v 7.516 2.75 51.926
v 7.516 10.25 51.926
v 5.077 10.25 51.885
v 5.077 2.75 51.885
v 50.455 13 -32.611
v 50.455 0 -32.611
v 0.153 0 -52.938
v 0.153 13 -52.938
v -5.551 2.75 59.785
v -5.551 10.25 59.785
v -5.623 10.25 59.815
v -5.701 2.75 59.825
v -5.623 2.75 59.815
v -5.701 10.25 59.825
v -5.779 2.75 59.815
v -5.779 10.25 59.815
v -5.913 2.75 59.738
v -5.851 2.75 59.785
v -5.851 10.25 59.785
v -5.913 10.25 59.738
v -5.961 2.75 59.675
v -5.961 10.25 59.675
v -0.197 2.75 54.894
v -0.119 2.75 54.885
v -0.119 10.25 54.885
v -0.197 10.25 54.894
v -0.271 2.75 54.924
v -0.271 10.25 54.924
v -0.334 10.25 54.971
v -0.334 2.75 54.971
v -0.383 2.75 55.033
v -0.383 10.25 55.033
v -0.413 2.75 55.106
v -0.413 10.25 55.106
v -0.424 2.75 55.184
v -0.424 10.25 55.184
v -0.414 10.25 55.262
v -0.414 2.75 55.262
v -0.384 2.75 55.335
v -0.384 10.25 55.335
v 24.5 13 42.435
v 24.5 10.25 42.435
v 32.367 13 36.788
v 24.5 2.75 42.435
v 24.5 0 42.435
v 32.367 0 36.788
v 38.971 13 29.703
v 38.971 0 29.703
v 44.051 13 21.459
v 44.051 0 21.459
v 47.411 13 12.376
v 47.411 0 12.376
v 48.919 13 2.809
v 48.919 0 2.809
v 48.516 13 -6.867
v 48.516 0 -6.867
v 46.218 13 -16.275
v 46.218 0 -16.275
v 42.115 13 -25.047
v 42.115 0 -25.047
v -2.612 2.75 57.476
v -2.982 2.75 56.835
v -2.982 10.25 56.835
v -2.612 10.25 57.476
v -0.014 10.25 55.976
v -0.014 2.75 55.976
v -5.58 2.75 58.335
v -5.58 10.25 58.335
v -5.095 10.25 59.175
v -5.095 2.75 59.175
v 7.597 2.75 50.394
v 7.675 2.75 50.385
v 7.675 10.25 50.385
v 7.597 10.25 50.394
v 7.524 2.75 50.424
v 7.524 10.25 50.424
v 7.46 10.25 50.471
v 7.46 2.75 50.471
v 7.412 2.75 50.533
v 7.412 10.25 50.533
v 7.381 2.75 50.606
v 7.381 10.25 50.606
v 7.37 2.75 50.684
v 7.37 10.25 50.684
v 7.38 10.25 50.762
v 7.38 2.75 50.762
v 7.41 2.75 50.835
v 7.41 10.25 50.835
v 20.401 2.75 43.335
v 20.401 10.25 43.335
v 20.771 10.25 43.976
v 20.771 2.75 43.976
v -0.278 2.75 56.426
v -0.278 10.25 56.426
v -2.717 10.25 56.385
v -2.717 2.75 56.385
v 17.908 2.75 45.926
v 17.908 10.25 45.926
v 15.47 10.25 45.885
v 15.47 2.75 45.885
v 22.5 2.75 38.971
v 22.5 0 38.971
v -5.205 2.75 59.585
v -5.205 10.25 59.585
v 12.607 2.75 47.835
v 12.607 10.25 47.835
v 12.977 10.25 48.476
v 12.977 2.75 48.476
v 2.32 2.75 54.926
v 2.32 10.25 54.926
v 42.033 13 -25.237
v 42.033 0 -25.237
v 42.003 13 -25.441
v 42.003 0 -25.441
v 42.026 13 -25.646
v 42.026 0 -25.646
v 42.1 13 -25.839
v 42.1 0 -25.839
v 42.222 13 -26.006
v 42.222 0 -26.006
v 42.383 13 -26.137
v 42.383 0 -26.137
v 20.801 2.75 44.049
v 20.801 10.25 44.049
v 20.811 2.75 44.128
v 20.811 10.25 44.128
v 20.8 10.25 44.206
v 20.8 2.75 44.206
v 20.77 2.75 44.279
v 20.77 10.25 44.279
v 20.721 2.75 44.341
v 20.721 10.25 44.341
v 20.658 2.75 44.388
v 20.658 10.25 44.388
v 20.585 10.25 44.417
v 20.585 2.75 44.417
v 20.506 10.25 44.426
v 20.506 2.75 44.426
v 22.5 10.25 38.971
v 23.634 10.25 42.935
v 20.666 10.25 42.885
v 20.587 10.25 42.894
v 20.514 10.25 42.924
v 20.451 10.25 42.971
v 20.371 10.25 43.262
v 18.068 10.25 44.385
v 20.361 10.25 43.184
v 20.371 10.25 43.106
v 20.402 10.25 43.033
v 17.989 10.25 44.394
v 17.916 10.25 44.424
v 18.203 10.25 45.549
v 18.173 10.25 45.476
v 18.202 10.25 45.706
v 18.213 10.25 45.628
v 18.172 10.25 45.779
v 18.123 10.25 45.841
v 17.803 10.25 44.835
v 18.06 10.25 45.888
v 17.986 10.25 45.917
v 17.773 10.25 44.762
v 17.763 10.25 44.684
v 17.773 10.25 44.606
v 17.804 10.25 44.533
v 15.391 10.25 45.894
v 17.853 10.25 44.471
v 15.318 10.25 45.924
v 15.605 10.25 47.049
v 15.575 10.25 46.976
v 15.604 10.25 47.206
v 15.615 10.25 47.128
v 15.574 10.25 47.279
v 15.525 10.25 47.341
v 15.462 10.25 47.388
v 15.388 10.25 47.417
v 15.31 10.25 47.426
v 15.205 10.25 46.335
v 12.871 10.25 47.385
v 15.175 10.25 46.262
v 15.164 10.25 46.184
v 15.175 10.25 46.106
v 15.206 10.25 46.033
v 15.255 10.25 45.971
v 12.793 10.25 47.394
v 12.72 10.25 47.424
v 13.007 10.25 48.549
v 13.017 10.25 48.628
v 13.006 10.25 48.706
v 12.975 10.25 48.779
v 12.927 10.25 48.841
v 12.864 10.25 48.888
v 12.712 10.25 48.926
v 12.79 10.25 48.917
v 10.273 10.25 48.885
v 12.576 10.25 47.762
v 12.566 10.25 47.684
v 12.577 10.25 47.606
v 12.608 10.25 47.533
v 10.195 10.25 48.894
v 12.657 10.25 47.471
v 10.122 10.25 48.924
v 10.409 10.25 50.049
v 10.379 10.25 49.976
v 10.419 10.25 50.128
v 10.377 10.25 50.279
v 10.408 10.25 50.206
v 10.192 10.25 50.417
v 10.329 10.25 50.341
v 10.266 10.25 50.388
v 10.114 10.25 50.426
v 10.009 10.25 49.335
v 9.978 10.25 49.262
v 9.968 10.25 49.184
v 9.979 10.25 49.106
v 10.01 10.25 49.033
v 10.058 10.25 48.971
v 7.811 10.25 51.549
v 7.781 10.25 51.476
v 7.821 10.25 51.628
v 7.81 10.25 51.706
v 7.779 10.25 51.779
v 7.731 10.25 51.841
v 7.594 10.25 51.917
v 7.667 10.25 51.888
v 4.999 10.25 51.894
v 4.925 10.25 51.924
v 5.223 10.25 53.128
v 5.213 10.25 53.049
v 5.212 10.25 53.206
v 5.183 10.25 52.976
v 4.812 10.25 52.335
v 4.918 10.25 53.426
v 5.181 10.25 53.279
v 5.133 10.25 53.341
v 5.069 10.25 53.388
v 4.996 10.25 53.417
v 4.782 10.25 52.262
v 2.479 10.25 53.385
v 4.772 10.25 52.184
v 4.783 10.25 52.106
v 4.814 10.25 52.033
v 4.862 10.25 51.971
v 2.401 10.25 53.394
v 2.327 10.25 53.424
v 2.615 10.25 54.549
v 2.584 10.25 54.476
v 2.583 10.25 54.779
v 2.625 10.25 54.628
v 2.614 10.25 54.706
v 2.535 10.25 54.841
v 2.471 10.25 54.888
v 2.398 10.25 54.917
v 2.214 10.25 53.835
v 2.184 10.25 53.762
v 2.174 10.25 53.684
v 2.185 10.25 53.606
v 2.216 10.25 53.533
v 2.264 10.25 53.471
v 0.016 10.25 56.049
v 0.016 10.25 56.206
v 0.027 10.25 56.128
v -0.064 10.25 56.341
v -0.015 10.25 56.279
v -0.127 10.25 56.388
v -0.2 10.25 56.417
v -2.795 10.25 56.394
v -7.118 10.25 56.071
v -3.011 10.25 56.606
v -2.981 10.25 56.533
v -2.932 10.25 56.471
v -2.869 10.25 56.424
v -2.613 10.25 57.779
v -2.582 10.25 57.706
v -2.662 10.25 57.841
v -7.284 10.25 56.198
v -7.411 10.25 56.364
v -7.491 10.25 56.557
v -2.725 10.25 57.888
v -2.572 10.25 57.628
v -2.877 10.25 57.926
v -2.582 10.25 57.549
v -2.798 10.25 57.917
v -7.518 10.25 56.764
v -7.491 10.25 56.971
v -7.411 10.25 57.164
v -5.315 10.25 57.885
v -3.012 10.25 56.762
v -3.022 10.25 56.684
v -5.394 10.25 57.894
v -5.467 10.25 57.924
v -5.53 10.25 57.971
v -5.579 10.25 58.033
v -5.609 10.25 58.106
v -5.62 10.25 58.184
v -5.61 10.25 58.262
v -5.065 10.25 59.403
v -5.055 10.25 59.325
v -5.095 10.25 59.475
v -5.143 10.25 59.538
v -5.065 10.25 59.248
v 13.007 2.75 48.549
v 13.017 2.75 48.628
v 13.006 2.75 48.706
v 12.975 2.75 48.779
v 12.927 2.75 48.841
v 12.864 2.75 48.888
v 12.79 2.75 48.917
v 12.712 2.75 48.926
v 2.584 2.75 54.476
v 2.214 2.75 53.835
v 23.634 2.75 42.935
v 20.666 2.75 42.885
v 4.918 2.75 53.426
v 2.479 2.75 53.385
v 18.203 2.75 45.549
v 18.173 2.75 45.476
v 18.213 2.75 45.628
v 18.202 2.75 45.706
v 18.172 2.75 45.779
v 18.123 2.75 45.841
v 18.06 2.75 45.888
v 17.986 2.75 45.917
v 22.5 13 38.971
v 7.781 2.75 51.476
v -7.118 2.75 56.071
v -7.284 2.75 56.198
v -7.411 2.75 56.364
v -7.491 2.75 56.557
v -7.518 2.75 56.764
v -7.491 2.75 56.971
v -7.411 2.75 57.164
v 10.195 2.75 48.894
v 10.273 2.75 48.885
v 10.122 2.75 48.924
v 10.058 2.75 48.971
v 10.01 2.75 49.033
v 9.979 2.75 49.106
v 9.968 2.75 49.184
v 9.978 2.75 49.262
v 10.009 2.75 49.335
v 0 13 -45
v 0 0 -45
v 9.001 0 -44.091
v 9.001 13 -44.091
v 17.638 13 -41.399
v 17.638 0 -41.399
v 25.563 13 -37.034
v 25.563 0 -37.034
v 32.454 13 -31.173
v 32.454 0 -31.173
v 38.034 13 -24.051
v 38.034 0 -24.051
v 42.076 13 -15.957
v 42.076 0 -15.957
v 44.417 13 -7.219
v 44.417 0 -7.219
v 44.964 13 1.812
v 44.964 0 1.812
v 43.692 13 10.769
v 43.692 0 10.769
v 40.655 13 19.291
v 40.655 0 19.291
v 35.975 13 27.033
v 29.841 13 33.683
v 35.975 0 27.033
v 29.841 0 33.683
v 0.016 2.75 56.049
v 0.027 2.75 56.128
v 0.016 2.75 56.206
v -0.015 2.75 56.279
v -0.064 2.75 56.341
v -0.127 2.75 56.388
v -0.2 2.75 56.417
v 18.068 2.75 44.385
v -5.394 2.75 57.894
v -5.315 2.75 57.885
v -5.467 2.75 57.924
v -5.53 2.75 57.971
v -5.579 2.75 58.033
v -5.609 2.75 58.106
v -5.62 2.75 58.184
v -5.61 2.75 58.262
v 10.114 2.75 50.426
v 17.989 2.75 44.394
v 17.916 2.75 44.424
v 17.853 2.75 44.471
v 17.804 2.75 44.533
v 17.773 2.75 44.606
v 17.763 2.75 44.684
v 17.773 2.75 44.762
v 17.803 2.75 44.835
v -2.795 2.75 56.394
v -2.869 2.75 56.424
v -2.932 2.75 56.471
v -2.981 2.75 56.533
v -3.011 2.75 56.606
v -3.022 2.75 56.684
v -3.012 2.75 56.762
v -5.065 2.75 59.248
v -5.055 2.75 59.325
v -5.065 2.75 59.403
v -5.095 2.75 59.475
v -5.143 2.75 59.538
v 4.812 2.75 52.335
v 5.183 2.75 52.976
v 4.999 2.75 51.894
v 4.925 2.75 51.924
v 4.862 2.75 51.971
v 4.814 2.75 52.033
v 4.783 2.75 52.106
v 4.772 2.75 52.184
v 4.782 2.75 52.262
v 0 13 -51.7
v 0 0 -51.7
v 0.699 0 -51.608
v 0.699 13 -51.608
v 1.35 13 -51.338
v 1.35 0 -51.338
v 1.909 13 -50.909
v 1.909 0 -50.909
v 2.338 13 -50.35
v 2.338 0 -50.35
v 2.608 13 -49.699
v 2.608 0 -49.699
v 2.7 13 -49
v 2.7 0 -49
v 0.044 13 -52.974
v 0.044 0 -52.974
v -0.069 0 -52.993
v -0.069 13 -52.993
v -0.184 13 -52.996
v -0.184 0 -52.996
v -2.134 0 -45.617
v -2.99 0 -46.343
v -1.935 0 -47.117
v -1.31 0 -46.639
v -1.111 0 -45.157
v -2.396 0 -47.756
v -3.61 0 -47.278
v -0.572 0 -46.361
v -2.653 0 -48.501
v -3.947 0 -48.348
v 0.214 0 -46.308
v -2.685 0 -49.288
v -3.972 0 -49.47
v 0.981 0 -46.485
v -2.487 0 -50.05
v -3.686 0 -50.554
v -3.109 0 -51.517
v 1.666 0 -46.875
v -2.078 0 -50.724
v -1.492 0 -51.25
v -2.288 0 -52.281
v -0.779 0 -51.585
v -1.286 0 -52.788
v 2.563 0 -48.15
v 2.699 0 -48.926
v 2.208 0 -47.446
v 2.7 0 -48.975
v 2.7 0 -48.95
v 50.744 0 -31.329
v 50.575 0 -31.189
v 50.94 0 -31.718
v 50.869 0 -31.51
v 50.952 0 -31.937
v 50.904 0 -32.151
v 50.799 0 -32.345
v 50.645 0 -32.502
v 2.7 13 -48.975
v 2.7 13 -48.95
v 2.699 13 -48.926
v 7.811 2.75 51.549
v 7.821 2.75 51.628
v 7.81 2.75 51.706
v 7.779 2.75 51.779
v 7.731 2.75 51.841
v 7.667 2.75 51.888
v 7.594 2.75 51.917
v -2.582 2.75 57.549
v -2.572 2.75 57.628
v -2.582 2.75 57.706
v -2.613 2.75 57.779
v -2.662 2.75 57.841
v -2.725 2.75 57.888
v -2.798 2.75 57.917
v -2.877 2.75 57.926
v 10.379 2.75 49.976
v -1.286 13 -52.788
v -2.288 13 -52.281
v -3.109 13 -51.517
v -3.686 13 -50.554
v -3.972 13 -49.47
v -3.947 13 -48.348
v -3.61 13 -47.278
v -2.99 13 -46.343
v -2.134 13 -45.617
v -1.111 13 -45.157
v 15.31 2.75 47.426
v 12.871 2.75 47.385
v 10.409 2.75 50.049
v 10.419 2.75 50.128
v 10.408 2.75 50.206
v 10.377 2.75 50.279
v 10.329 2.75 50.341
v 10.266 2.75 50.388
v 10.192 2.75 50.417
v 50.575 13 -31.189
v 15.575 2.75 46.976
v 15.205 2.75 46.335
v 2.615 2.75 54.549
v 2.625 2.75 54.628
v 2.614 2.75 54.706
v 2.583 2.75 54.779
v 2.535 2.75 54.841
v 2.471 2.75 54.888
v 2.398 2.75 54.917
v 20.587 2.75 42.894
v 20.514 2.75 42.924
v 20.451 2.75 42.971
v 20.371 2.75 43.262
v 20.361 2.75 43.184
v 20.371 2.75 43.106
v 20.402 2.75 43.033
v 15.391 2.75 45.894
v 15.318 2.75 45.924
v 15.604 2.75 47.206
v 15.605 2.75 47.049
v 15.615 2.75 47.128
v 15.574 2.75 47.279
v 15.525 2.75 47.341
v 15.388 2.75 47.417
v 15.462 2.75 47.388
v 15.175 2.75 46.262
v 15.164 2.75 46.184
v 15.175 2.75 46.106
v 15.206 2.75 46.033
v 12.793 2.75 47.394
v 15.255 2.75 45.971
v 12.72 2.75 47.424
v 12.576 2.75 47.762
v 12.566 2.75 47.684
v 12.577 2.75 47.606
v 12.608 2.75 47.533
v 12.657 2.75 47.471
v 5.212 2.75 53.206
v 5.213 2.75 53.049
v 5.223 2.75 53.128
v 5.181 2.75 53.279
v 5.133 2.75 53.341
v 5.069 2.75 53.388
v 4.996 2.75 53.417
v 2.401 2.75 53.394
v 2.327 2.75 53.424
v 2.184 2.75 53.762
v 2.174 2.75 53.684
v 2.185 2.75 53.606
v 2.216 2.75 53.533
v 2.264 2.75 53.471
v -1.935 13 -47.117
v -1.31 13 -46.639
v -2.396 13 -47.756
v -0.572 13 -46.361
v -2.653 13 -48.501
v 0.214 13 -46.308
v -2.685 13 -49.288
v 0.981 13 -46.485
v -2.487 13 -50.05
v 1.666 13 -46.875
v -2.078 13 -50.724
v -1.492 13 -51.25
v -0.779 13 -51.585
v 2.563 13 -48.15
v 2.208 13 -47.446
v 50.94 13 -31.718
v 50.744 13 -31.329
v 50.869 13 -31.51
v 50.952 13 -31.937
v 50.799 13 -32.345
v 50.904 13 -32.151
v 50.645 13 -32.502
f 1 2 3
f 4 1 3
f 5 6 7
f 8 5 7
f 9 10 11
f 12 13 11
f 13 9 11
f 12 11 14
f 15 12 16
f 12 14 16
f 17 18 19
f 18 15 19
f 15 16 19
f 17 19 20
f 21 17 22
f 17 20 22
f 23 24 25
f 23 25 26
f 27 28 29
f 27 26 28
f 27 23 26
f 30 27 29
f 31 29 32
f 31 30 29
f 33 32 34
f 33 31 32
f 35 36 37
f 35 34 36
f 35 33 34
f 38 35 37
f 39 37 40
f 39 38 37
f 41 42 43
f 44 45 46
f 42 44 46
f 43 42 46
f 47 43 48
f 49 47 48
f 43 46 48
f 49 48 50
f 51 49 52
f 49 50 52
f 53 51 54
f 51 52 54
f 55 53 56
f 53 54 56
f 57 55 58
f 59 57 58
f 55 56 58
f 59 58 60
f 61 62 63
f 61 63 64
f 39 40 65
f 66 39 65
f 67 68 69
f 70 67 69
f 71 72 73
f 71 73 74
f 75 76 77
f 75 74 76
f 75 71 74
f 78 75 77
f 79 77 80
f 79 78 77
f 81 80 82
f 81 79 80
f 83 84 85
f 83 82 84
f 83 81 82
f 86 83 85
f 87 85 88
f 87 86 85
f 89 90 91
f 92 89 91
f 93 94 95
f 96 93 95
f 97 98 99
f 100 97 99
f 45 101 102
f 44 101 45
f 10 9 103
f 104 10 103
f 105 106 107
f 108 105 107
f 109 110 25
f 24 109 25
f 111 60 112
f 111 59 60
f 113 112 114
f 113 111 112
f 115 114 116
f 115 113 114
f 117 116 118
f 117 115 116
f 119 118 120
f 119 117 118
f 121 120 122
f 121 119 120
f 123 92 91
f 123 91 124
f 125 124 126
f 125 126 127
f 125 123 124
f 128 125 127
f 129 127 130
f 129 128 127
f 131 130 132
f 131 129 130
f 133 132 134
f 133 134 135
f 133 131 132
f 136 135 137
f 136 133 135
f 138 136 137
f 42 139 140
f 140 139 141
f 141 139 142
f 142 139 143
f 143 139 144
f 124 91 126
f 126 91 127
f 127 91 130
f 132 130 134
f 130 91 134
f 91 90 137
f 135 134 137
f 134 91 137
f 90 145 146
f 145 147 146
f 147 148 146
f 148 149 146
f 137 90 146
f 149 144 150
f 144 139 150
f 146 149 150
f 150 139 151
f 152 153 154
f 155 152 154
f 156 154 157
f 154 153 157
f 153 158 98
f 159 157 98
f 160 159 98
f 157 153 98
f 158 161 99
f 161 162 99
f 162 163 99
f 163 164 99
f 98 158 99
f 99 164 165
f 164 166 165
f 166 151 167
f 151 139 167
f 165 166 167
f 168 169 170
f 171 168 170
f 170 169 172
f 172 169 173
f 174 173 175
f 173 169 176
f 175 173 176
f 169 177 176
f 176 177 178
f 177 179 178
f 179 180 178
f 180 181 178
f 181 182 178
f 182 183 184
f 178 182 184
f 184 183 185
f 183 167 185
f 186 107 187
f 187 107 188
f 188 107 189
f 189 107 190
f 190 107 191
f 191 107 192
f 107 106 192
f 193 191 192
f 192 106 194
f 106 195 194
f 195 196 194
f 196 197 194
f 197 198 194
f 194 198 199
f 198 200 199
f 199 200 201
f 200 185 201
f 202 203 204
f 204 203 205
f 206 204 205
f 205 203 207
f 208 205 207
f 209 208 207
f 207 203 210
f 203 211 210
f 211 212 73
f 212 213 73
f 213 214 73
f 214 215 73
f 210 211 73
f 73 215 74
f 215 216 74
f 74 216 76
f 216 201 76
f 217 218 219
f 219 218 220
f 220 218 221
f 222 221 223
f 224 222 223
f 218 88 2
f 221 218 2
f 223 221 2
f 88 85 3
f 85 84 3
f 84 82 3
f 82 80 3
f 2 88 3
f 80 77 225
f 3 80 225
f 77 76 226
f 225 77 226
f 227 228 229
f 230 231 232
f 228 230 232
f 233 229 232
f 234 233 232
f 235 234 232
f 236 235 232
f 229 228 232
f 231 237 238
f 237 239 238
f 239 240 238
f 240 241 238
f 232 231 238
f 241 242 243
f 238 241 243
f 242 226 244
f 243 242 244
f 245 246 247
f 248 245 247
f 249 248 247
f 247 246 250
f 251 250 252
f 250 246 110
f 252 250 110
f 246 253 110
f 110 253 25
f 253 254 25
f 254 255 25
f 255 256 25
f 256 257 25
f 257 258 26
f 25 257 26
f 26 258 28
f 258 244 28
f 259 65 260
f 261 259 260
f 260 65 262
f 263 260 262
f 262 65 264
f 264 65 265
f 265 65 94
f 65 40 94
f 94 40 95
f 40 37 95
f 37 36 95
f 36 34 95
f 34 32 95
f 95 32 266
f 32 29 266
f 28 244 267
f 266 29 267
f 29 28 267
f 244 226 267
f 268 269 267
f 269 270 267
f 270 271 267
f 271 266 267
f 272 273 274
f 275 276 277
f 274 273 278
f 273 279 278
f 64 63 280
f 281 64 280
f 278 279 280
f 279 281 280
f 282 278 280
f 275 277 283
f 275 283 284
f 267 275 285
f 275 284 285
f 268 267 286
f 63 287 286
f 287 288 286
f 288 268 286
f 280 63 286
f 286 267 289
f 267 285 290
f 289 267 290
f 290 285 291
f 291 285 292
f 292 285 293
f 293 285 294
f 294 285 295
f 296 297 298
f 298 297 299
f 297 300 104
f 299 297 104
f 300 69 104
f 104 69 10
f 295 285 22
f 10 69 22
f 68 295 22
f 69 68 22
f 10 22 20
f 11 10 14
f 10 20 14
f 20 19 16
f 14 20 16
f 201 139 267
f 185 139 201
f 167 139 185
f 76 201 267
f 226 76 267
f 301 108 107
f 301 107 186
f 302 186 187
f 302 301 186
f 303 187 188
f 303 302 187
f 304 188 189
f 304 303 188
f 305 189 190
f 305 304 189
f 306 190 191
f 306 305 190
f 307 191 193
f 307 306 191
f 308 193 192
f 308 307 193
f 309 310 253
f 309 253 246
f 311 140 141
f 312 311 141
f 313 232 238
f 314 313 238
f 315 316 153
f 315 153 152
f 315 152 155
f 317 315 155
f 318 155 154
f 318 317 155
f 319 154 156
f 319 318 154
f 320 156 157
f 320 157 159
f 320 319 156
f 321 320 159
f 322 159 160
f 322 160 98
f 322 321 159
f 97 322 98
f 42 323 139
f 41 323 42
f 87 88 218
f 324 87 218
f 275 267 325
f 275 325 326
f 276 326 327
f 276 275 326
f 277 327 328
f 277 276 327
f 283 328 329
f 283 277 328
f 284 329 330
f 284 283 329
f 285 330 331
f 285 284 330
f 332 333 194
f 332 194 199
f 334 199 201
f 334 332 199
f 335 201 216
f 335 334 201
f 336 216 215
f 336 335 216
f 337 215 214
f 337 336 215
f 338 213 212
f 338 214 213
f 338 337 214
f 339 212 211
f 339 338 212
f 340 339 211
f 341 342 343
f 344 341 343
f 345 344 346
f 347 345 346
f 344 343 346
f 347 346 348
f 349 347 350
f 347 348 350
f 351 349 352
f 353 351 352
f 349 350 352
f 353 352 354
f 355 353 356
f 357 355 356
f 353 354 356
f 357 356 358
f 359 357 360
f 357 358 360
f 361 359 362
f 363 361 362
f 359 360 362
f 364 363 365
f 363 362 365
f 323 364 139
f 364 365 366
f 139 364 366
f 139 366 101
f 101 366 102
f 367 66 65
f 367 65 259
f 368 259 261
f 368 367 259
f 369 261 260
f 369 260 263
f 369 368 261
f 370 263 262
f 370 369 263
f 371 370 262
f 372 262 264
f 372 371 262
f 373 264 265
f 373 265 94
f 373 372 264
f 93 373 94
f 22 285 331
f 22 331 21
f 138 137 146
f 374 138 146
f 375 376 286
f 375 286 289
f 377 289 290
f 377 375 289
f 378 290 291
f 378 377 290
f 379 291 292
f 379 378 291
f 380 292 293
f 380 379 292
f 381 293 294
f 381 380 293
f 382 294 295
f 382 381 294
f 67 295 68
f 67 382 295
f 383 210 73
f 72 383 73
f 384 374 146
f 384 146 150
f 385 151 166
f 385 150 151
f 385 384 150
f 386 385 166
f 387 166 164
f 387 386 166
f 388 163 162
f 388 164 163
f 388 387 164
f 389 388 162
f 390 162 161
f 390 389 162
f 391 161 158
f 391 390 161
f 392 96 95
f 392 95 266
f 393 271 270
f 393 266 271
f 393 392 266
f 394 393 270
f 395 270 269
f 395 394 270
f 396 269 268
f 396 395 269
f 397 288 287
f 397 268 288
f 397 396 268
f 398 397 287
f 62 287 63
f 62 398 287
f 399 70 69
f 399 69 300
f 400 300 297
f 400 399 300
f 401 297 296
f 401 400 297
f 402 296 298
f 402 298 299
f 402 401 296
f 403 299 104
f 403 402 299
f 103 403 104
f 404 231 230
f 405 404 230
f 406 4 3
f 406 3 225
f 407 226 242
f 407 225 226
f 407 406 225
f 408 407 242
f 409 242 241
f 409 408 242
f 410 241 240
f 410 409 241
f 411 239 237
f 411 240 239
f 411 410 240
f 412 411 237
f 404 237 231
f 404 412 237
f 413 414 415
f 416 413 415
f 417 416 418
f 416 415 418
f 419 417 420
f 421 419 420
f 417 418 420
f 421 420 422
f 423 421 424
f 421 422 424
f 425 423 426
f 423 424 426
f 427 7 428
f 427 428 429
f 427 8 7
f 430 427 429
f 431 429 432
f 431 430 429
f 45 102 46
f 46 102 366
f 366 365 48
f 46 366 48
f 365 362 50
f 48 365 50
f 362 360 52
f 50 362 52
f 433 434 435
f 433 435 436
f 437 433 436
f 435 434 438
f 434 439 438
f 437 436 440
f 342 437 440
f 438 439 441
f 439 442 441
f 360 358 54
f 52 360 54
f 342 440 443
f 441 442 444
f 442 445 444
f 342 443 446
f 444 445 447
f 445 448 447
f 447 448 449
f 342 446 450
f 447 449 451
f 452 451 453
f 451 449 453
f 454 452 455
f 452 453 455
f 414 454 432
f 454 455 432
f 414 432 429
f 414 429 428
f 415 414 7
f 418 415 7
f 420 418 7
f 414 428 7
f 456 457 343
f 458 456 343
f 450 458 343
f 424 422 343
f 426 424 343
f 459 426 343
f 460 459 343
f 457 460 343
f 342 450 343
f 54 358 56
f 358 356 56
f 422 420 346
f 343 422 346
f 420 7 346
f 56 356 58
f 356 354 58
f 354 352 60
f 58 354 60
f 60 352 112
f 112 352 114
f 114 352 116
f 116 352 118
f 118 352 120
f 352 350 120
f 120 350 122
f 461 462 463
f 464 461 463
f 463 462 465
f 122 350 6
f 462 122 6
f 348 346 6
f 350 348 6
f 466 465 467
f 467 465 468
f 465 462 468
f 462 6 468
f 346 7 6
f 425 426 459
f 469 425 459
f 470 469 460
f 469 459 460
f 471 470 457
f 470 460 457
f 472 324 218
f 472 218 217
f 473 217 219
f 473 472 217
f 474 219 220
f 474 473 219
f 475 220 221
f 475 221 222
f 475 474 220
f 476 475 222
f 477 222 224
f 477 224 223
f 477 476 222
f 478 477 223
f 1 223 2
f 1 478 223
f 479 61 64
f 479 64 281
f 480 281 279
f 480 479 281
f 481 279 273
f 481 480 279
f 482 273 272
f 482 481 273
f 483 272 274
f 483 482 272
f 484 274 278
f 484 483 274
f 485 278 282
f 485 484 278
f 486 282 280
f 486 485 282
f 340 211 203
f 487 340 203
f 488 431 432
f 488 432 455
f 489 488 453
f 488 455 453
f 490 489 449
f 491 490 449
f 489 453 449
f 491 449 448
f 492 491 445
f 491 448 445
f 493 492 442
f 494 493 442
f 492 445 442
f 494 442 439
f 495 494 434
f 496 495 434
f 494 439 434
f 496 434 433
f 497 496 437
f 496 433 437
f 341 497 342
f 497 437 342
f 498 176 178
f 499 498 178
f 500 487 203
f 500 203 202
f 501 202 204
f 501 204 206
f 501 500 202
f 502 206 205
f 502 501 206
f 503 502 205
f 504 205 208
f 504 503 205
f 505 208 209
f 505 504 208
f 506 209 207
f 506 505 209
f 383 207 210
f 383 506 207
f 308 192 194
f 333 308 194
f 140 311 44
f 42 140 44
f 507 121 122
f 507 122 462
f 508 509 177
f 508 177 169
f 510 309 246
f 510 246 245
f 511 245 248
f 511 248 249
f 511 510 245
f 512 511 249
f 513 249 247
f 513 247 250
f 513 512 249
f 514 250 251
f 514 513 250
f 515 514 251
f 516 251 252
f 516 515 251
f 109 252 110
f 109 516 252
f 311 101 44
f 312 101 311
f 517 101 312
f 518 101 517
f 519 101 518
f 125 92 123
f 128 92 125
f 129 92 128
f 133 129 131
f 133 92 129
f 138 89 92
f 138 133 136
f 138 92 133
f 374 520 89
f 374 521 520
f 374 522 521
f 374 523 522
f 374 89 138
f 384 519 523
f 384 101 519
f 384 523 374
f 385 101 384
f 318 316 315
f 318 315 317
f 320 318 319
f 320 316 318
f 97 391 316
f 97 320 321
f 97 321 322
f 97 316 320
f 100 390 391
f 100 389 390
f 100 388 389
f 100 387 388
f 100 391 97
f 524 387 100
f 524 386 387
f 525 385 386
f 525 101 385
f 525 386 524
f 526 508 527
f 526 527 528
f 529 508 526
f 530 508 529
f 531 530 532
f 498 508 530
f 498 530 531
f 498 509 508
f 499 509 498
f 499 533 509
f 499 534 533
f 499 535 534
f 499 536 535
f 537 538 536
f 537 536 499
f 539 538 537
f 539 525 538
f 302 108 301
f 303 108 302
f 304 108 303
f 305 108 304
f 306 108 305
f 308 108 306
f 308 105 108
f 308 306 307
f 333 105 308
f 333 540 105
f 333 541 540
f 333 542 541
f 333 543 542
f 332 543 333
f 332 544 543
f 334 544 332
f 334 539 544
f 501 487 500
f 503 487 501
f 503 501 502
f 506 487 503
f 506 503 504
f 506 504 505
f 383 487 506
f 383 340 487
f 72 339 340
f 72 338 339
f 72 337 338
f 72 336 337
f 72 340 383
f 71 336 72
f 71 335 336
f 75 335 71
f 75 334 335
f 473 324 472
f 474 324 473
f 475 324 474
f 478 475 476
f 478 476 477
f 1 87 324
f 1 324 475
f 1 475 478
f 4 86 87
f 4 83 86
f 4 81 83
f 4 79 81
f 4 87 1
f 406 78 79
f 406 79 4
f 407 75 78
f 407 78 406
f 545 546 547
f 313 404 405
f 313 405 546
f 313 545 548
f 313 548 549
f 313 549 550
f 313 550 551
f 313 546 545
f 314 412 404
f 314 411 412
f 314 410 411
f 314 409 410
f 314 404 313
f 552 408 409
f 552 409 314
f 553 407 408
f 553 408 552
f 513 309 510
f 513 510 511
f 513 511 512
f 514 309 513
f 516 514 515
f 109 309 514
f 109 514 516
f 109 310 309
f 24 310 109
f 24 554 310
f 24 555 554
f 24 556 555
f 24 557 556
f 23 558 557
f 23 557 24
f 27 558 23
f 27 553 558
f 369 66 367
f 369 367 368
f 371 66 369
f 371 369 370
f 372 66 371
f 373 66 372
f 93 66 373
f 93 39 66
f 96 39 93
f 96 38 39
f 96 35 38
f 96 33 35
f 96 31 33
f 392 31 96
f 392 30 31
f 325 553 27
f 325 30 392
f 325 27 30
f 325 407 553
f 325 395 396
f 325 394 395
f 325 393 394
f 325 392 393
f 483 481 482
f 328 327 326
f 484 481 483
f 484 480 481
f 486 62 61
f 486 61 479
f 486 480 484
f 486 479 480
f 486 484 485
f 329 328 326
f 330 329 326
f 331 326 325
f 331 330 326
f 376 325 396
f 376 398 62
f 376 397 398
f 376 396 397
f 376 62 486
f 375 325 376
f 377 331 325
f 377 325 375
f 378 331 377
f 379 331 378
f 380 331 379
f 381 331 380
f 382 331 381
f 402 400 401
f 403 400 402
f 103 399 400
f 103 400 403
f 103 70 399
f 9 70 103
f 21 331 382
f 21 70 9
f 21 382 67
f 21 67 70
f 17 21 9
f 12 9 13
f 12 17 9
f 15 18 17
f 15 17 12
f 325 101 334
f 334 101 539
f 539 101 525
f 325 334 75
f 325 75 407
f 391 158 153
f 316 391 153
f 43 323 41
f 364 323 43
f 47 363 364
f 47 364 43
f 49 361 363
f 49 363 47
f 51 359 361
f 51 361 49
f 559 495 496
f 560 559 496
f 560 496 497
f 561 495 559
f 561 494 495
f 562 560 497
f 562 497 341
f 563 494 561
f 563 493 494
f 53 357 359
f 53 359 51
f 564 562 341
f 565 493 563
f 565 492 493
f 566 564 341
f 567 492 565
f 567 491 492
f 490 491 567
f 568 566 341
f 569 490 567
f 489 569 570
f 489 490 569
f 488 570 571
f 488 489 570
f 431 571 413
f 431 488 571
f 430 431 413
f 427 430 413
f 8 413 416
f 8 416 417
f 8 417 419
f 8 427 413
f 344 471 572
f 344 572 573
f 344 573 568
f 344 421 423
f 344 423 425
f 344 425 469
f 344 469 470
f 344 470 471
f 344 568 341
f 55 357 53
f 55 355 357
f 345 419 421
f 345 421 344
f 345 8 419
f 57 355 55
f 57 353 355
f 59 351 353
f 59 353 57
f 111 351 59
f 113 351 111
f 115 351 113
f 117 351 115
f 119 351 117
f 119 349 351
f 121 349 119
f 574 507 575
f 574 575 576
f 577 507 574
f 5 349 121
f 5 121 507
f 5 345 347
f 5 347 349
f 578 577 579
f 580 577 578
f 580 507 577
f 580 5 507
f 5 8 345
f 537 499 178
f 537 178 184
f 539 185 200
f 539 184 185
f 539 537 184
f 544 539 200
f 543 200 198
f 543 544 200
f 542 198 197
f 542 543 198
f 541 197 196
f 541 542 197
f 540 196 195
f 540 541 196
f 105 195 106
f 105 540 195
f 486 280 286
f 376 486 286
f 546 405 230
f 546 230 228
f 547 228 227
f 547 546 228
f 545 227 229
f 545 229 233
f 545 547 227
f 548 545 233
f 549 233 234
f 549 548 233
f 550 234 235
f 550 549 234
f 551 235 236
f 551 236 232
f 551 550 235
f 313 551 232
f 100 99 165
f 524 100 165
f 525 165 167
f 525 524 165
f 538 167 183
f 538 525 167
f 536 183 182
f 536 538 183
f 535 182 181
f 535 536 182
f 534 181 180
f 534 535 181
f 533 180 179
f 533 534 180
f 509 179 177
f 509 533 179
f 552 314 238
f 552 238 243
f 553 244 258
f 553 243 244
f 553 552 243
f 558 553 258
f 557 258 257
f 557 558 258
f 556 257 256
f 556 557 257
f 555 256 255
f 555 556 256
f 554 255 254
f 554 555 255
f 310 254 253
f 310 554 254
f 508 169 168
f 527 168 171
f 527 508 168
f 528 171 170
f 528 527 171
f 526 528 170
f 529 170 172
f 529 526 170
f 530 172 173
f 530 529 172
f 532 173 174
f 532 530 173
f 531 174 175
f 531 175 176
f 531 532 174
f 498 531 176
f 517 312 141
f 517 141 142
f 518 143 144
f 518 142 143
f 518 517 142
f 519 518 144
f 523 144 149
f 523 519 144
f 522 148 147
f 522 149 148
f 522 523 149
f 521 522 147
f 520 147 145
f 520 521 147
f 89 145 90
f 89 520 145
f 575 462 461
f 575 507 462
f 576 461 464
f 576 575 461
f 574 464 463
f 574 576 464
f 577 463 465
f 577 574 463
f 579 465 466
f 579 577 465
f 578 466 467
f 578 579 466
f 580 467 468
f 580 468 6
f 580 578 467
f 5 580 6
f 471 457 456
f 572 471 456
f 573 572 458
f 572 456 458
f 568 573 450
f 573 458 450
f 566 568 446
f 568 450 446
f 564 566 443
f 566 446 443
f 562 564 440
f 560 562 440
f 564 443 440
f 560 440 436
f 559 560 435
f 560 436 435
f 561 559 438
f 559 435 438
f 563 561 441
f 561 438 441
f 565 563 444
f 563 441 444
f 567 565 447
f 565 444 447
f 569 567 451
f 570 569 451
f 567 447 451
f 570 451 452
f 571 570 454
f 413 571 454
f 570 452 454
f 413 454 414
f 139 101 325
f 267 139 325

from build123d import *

# Parameters (mm, degrees)
BOSS_EXTRUDE1_DEPTH = 13
CUT_EXTRUDE3_DEPTH  = 14
FILLET2_R           = 0.3
FILLET1_R           = 0.8
SKETCH3_OUTSIDE_W   = 154.491
SKETCH3_OUTSIDE_H   = 40.548
SKETCH3_OUTSIDE_W_2 = 5.910380326
SKETCH3_OUTSIDE_H_2 = 7.5
CUT_EXTRUDE2_DEPTH  = 35


with BuildPart() as part:
    # Sketch1 → Boss-Extrude1 (new body)
    with BuildSketch(Plane(origin=(0, 0, 0), x_dir=(1, 0, 0), z_dir=(0, 1, 0))):
        with BuildLine():
            Line((0, 51.7), (0, 53))
            ThreePointArc((0, 53), (-4, 49), (0, 45))
            ThreePointArc((0, 45), (43.466662183, 11.64685703), (22.5, -38.97114317))
            Line((22.5, -38.97114317), (-7.810889132, -56.47114317))
            Line((-7.810889132, -56.47114317), (-5.810889132, -59.935244785))
            Line((-5.810889132, -59.935244785), (24.5, -42.435244785))
            ThreePointArc((24.5, -42.435244785), (47.509263839, -11.994575836), (41.707047143, 25.720074234))
            ThreePointArc((41.707047143, 25.720074234), (25.051905135, 42.111780407), (2.698975076, 48.925612245))
            ThreePointArc((2.698975076, 48.925612245), (-1.935309657, 47.117295421), (0, 51.7))
        make_face()
        with BuildLine():
            Line((51.921017872, 32.018867925), (0, 53))
            Line((0, 53), (0, 51.7))
            ThreePointArc((0, 51.7), (1.909188309, 50.909188309), (2.7, 49))
            ThreePointArc((2.7, 49), (2.699743757, 48.962802592), (2.698975076, 48.925612245))
            ThreePointArc((2.698975076, 48.925612245), (25.051905135, 42.111780407), (41.707047143, 25.720074234))
            Line((41.707047143, 25.720074234), (51.921017872, 32.018867925))
        make_face()
    extrude(amount=BOSS_EXTRUDE1_DEPTH)

    # Sketch2 → Cut-Extrude3 (cut, through all)
    with BuildSketch(Plane(origin=(0, 13, 0), x_dir=(1, 0, 0), z_dir=(0, 1, 0))):
        Polygon((-5.844863729, -57.876399059), (-4.944863729, -59.435244785), (-2.346787517, -57.935244785), align=None)
        Polygon((-3.246787517, -56.376399059), (-2.346787517, -57.935244785), (0.251288694, -56.435244785), align=None)
        Polygon((-0.648711306, -54.876399059), (0.251288694, -56.435244785), (2.849364905, -54.935244785), align=None)
        Polygon((1.949364905, -53.376399059), (2.849364905, -54.935244785), (5.447441117, -53.435244785), align=None)
        Polygon((4.547441117, -51.876399059), (5.447441117, -53.435244785), (8.045517328, -51.935244785), align=None)
        Polygon((7.145517328, -50.376399059), (8.045517328, -51.935244785), (10.643593539, -50.435244785), align=None)
        Polygon((9.743593539, -48.876399059), (10.643593539, -50.435244785), (13.241669751, -48.935244785), align=None)
        Polygon((12.341669751, -47.376399059), (13.241669751, -48.935244785), (15.839745962, -47.435244785), align=None)
        Polygon((14.939745962, -45.876399059), (15.839745962, -47.435244785), (18.437822174, -45.935244785), align=None)
        Polygon((17.537822174, -44.376399059), (18.437822174, -45.935244785), (21.035898385, -44.435244785), align=None)
        Polygon((20.135898385, -42.876399059), (21.035898385, -44.435244785), (23.633974596, -42.935244785), align=None)
    extrude(amount=-CUT_EXTRUDE3_DEPTH, mode=Mode.SUBTRACT)

    # Fillet2
    fillet2_edges = [part.edges().sort_by_distance(p)[0] for p in [
        (-3.246787517, 6.5, 56.376399059),
        (0.251288694, 6.5, 56.435244785),
        (1.949364905, 6.5, 53.376399059),
        (5.447441117, 6.5, 53.435244785),
        (7.145517328, 6.5, 50.376399059),
        (10.643593539, 6.5, 50.435244785),
        (12.341669751, 6.5, 47.376399059),
        (15.839745962, 6.5, 47.435244785),
        (17.537822174, 6.5, 44.376399059),
        (21.035898385, 6.5, 44.435244785),
        (-5.810889132, 6.5, 59.935244785),
        (-5.844863729, 6.5, 57.876399059),
        (-2.346787517, 6.5, 57.935244785),
        (-4.944863729, 6.5, 59.435244785),
        (-0.648711306, 6.5, 54.876399059),
        (2.849364905, 6.5, 54.935244785),
        (4.547441117, 6.5, 51.876399059),
        (8.045517328, 6.5, 51.935244785),
        (9.743593539, 6.5, 48.876399059),
        (13.241669751, 6.5, 48.935244785),
        (14.939745962, 6.5, 45.876399059),
        (18.437822174, 6.5, 45.935244785),
        (20.135898385, 6.5, 42.876399059),
    ]]
    fillet(fillet2_edges, radius=FILLET2_R)

    # Fillet1
    fillet1_edges = [part.edges().sort_by_distance(p)[0] for p in [
        (51.921017872, 6.5, -32.018867925),
        (41.707047143, 6.5, -25.720074234),
        (-7.810889132, 6.5, 56.47114317),
        (0, 6.5, -53),
    ]]
    fillet(fillet1_edges, radius=FILLET1_R)

    # Sketch3 outside → Cut-Extrude2 (cut)
    with BuildSketch(Plane(origin=(-30.310889132, 0, 17.5), x_dir=(0.5, 0, 0.866025404), z_dir=(-0.866025404, 0, 0.5))):
        with Locations((13.8165, 6.5)):
            Rectangle(SKETCH3_OUTSIDE_W, SKETCH3_OUTSIDE_H)
        with Locations((47.141631591, 6.5)):
            Rectangle(SKETCH3_OUTSIDE_W_2, SKETCH3_OUTSIDE_H_2, mode=Mode.SUBTRACT)
    extrude(amount=-CUT_EXTRUDE2_DEPTH, mode=Mode.SUBTRACT)


solid = part.part
